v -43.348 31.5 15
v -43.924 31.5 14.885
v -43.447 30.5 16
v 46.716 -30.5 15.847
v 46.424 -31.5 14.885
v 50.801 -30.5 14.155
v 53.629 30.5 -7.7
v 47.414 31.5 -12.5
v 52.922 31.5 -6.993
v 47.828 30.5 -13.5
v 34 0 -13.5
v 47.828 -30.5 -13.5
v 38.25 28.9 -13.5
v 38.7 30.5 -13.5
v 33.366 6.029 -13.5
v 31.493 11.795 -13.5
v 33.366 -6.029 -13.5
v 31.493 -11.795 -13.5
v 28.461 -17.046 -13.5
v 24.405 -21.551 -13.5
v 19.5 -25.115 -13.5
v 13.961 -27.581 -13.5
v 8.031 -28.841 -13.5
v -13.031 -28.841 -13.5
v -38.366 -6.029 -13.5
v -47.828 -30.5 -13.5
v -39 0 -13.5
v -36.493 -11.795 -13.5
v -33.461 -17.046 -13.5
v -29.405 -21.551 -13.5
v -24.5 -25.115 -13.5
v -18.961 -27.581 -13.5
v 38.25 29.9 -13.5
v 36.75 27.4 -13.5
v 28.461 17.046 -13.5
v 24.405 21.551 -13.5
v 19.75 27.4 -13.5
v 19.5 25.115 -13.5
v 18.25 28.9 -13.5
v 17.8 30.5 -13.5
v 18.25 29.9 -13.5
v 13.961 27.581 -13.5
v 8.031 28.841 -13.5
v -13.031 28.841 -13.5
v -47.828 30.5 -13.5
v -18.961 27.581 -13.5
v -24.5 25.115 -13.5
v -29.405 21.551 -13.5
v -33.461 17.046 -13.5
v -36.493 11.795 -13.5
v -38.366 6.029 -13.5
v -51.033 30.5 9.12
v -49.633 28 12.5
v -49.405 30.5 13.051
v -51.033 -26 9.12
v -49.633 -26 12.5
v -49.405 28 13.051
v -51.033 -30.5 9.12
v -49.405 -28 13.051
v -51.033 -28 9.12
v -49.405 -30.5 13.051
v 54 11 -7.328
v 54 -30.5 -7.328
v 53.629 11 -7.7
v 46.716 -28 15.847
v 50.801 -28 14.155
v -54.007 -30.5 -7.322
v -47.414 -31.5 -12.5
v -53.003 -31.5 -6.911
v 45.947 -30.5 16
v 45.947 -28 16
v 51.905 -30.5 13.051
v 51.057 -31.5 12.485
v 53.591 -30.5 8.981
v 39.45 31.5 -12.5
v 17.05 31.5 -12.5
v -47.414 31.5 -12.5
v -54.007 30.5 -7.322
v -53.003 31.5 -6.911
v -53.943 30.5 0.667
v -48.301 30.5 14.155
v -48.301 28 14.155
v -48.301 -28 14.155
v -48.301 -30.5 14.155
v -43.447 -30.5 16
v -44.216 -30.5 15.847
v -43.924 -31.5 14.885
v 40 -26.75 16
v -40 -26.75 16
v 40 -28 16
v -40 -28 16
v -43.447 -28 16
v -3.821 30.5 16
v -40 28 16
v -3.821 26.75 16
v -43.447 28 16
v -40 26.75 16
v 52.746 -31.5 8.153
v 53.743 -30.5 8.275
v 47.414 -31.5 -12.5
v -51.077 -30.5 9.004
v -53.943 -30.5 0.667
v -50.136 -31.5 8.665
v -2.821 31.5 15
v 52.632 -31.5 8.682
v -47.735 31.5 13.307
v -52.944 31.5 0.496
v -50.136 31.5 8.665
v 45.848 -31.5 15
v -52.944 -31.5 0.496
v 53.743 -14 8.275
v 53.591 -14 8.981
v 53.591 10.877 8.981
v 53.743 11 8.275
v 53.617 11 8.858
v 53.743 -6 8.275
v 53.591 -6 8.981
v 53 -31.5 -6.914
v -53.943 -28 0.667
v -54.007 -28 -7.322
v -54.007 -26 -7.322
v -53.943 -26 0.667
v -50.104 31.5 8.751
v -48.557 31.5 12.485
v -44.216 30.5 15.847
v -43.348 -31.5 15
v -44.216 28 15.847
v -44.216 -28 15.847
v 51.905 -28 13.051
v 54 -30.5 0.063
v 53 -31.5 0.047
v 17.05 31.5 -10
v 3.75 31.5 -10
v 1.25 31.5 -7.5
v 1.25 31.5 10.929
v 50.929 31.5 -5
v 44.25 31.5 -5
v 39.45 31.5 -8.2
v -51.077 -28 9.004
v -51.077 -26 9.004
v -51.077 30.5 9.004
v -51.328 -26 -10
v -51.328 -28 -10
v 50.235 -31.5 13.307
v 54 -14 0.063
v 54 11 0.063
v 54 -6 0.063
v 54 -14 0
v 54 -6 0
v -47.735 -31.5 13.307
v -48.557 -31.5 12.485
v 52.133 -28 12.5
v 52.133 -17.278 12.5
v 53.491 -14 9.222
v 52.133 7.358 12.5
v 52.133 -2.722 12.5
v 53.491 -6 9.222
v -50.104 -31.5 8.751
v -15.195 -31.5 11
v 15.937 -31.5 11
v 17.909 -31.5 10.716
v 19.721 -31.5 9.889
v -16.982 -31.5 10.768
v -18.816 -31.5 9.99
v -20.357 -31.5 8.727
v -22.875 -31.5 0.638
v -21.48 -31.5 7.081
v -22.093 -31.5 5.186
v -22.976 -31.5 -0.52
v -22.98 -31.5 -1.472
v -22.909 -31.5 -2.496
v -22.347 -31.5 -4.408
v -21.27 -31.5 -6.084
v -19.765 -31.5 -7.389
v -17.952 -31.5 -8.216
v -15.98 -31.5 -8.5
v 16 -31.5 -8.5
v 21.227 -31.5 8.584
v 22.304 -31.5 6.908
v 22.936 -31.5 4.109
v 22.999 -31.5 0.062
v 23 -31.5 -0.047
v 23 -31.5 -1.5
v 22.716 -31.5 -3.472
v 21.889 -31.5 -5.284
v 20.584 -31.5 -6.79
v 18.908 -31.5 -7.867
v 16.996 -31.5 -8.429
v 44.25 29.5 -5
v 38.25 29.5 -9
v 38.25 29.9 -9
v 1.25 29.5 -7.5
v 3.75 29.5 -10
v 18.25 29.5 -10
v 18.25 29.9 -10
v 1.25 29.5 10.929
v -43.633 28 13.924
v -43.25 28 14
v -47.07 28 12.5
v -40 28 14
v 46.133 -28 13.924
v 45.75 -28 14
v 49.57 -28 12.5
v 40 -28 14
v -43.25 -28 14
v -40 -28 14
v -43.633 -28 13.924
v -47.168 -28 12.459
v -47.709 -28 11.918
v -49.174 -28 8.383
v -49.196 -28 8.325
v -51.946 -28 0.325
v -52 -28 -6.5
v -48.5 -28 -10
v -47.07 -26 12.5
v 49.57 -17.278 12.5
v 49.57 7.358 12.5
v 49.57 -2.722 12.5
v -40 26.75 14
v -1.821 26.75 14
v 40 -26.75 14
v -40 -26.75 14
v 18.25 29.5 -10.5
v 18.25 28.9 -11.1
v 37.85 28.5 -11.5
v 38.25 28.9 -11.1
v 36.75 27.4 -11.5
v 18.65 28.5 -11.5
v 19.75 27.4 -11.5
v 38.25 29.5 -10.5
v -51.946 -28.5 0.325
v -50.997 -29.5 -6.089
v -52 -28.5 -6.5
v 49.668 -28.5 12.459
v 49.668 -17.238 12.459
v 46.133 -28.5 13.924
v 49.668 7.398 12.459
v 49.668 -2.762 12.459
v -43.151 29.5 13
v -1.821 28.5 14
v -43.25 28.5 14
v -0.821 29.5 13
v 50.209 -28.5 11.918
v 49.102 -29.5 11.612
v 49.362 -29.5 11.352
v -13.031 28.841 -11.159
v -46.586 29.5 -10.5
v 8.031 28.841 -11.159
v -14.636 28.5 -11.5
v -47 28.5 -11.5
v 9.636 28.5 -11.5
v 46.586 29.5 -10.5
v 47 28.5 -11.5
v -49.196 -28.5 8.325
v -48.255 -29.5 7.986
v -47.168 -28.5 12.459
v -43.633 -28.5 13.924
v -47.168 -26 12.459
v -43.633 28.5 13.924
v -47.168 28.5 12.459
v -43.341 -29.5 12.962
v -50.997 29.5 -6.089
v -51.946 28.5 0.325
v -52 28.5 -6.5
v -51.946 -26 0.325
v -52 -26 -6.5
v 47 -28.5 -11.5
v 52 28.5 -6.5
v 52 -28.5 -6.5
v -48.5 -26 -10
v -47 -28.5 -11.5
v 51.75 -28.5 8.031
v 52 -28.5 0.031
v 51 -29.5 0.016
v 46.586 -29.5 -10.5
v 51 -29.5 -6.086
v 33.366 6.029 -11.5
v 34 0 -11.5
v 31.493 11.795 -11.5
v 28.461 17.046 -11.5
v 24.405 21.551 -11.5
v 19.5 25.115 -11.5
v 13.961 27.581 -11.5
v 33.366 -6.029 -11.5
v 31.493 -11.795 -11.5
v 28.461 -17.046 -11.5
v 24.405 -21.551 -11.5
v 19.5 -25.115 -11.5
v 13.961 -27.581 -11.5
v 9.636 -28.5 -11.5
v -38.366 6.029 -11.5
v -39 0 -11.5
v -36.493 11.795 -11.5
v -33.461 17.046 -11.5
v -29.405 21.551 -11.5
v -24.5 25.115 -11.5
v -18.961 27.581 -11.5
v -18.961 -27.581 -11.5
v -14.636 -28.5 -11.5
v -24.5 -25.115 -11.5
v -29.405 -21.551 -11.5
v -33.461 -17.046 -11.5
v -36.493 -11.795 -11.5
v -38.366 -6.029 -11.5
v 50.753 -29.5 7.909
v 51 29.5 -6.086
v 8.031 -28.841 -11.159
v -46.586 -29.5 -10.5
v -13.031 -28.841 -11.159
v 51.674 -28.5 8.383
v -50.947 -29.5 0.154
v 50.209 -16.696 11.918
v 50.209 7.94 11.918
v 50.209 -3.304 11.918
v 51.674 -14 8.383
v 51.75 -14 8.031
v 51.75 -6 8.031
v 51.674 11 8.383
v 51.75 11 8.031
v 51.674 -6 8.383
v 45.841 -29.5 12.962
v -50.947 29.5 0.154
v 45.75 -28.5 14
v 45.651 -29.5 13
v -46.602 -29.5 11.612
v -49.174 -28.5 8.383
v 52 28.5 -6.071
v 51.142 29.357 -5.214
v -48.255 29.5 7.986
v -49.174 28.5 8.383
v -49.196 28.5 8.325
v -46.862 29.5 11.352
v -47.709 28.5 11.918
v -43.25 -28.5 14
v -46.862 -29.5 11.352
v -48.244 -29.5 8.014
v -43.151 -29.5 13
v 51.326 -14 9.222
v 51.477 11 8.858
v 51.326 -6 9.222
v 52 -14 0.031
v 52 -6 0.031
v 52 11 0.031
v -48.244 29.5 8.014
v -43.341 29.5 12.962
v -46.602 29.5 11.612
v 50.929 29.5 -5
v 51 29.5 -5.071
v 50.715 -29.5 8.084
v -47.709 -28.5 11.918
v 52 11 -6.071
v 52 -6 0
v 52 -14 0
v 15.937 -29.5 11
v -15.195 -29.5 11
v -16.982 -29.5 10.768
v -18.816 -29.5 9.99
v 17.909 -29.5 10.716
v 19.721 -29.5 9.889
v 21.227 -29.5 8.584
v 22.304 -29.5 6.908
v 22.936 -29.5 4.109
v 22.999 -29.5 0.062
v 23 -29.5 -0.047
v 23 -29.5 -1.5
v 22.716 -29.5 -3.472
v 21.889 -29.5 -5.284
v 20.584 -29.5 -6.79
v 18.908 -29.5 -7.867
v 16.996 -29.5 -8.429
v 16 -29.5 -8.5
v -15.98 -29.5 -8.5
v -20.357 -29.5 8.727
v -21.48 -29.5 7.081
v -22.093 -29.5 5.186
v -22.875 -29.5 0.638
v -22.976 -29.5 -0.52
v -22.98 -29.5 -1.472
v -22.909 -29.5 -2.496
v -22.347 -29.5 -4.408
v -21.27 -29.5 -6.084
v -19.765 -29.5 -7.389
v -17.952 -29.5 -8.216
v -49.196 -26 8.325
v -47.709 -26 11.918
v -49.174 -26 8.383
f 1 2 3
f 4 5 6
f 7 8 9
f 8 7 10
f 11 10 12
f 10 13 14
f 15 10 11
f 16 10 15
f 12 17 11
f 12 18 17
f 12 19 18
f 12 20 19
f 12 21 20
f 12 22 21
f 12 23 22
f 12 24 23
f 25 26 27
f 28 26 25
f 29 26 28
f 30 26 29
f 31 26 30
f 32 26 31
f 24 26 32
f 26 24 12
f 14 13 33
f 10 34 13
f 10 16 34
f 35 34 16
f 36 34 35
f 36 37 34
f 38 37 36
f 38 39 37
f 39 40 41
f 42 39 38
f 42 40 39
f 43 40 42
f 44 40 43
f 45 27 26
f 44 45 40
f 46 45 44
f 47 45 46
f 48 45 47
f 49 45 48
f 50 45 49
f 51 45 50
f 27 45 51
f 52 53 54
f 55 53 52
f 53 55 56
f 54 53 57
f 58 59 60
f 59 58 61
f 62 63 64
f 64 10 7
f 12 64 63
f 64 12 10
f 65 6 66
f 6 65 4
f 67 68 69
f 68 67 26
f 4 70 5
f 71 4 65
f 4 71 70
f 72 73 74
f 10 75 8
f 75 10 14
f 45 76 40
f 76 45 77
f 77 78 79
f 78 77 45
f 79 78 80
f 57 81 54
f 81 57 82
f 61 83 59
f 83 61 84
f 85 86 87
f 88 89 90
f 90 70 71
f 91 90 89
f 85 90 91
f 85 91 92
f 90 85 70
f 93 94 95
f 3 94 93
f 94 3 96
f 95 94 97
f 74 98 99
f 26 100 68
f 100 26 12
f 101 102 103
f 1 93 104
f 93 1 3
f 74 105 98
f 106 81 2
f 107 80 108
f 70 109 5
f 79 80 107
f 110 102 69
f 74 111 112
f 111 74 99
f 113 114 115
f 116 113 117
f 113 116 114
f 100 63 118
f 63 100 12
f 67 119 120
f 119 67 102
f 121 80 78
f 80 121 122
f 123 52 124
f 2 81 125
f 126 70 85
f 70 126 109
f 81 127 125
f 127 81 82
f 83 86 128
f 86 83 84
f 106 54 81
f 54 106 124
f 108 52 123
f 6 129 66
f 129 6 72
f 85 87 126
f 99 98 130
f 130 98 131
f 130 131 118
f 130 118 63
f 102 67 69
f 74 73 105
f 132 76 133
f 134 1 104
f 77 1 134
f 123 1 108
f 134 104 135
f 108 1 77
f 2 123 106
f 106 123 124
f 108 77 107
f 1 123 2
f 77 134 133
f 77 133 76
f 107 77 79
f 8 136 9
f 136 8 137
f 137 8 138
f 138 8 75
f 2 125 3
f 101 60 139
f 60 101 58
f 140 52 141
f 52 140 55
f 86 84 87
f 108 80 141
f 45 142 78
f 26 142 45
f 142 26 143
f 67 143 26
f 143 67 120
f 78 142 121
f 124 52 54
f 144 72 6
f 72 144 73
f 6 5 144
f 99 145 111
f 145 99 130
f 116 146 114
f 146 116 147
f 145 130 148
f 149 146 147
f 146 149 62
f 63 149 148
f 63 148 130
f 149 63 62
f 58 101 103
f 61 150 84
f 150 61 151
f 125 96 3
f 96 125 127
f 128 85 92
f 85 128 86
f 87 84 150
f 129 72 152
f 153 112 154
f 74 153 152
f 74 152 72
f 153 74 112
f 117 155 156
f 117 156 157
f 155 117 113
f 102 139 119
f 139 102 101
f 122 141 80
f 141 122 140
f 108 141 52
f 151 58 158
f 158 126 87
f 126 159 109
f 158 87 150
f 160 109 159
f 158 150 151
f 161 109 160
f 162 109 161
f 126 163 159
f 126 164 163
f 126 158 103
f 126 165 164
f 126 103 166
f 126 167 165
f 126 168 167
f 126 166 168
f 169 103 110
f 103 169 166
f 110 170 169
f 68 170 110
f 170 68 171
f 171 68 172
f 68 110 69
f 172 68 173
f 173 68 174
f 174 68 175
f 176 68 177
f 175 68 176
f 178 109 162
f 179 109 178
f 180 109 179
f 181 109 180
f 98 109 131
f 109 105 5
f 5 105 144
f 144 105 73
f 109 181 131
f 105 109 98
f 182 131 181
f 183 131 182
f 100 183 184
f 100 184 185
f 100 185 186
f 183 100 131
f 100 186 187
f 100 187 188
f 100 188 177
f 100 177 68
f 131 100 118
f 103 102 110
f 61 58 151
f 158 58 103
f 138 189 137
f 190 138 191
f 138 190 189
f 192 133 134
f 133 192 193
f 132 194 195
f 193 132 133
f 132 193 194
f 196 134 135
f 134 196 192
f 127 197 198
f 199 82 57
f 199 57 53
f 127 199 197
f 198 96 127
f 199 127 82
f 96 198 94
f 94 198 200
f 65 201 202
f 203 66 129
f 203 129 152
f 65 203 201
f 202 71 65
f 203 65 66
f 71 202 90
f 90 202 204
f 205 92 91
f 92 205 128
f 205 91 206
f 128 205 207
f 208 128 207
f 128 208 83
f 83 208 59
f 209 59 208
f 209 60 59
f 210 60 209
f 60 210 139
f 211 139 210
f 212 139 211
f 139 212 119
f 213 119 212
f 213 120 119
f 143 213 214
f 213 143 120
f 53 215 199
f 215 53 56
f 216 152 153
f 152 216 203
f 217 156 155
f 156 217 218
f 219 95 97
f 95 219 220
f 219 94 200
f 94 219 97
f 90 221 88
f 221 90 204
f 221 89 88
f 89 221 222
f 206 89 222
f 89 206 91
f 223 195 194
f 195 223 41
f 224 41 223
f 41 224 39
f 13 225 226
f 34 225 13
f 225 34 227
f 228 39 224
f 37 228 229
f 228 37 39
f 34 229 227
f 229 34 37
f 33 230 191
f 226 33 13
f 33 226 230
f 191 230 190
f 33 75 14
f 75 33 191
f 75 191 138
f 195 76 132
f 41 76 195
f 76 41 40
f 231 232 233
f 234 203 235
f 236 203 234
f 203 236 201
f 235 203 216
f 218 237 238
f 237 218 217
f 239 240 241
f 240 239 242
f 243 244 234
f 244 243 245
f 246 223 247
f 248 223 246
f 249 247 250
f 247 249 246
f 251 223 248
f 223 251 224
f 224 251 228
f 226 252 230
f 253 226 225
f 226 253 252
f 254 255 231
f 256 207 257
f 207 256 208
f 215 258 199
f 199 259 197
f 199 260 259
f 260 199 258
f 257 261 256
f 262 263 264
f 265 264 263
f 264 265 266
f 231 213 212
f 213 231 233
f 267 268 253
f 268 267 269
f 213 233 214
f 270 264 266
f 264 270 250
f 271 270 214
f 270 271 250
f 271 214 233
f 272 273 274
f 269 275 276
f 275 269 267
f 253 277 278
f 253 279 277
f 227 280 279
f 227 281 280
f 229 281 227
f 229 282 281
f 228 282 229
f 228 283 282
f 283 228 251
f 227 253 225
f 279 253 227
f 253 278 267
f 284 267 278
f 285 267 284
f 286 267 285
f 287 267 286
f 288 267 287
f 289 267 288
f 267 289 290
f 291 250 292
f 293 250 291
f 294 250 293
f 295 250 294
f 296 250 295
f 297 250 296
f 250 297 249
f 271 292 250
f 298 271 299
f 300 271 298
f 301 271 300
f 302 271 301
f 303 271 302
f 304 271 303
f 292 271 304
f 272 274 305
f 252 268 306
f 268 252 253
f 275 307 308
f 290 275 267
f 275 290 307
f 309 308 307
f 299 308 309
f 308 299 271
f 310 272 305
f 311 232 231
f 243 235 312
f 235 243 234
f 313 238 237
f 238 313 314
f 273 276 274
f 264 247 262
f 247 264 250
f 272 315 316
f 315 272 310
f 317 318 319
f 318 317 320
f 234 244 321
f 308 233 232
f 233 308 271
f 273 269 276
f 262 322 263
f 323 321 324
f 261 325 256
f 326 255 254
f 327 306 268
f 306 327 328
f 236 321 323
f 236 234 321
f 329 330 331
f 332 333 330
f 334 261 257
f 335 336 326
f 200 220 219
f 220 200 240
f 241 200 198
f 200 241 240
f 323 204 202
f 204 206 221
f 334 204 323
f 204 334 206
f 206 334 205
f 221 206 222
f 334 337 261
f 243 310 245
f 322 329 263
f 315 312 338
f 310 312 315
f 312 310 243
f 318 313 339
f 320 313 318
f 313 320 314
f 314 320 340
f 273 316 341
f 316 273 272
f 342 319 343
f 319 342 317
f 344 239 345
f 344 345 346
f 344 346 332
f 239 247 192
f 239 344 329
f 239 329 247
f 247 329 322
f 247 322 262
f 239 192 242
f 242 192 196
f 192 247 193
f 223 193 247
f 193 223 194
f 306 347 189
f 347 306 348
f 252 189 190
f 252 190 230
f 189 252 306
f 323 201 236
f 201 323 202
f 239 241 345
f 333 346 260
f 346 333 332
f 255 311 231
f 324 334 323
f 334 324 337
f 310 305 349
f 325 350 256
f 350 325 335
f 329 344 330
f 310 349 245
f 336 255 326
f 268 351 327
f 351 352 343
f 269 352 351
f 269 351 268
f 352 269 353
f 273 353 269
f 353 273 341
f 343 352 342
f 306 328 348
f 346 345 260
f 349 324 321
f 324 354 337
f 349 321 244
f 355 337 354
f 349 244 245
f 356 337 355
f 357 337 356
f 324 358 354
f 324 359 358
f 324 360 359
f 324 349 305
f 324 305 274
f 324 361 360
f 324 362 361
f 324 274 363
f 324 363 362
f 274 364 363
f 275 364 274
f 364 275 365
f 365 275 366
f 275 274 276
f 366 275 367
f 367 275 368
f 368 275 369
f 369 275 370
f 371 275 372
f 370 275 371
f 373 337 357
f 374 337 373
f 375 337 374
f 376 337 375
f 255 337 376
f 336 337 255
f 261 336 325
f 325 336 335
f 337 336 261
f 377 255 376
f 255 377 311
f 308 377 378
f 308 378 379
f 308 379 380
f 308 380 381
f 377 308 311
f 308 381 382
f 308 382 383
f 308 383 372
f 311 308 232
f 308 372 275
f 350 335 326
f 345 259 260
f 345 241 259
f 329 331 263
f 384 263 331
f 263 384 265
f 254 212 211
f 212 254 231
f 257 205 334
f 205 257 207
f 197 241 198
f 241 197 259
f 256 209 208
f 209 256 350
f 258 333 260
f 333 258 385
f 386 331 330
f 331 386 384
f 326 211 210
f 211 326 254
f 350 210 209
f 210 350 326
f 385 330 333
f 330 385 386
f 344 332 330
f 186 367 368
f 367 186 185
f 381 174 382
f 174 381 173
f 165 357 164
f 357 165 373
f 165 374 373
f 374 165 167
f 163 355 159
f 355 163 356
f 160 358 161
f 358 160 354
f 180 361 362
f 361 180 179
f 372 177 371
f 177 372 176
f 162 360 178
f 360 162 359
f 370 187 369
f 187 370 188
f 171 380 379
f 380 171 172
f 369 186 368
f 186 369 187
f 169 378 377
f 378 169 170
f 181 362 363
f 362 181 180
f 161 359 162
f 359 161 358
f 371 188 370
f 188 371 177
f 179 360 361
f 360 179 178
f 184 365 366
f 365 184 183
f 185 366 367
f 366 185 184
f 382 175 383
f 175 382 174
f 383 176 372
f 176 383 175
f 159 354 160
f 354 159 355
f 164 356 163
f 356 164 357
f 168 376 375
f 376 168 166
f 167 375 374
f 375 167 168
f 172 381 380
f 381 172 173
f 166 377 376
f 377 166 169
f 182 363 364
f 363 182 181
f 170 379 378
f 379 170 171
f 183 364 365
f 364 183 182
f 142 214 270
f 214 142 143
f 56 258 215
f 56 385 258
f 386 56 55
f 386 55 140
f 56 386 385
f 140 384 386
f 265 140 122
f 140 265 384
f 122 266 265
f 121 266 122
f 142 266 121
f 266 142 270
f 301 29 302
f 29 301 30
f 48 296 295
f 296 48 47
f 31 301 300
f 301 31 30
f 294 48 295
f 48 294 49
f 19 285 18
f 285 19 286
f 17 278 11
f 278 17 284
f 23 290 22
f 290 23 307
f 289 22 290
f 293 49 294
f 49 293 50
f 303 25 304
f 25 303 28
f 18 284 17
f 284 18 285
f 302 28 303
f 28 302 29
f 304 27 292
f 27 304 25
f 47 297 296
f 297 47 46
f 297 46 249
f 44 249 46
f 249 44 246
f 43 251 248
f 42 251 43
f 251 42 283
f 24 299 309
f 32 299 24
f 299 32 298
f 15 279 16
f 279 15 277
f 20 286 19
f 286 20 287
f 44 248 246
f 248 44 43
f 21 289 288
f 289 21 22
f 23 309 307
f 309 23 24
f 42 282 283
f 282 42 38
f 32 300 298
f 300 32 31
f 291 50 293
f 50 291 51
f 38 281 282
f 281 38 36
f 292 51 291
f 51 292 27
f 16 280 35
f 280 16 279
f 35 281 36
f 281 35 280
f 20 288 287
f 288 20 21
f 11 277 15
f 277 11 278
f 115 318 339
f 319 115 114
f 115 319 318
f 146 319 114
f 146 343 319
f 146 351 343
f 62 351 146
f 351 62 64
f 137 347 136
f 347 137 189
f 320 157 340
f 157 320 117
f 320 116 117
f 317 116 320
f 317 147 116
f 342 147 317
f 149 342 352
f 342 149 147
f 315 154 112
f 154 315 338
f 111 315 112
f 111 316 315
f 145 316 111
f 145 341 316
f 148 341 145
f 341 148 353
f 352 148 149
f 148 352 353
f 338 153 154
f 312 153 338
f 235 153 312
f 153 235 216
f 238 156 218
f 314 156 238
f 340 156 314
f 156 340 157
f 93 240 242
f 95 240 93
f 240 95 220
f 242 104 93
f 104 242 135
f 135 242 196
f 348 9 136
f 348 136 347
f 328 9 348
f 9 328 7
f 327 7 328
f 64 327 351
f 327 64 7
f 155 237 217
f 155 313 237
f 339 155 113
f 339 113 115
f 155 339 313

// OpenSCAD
// file: polyround2019.scad
//p=mirrorPolyline([[-1,-4,11,4],[-10,0,14,4],[-12,20,20,4],[-20,50,40,4],[-20,80,40,4],[-20,110,30,4],[-10,100,0,4],[-10,0,0,5],[-20,5,5,4],[-20,5,16,2],[-10,4,12,4] ]);

//polyline(p);
// 
//
// color ("yellow")polyline (polyRound(let(ip=([for (i=[0:3])[rnd(0,30),rnd(0,100),rnd(0,30),2+rnd(2)] ]))
//     mirrorPolyline([for(i=[0:0.5:len(ip)-1]) i==floor(i)?ip[i]: ip[i]+
//     [
// floor(rnd(2))==0? 0:max(0,rnd(10,20)*sign(rnd(-1,1))),
// floor(rnd(6))==0? 0:rnd(10,20)*sign(rnd(-1,1)),
// floor(rnd(2))==0? 0.01:rnd(10,20)*sign(rnd(-1,1)),
// 0(0,30),2+rnd(2)] ]))
//     mirrorPolyline([for(i=[0:0.5:len(ip)-1]) i==floor(i)?ip[i]: ip[i]+
//     [
// floor(rnd(2))==0? 0:max(0,rnd(10,20)*sign(rnd(-1,1))),
// floor(rnd(6))==0? 0:rnd(10,20)*sign(rnd(-1,1)),
// floor(rnd(2))==0? 0.01:rnd(10,20)*sign(rnd(-1,1)),
// 0
// ]  ])) ,2.5);
// ]  ])) ,1.5);
// 
// color ("darkgrey")polyline (polyRound(let(ip=([for (i=[0:2])[rnd(0,30),rnd(0,100),rnd


function polyRound(radiipoints,fn=5)=
// reworte most of it all here heavily use of wrap function
let(p=getpoints(radiipoints)) 
let(r=getradii(radiipoints))
let(Lp1=last(p),Lp=Lp1+1) 
let(
temp=[for(i=[0:last(p)]) 
round3points(
[ p[wrap(i-1,Lp,0)], p[wrap(i  ,Lp,0)], p[wrap(i+1,Lp,0)]],
r[i],
fn)])   //common trick  to flatten a list of list
[for (a = temp )        for (b = a) b];






 
 


function round3points(v,r,fn=6)=let(
p0=v[0],p1=v[1],p2=v[2],
n01=un(p0-p1),
n21=un(p2-p1),
planeNormal=un(cross(n21,n01)),
 

midLineNormal=un(n01 +n21),
 
angle=angle(n21,n01),
tanD=r /sin(angle/2),
 
center=p1+  midLineNormal*( tanD)
 

)
concat(
 [ for(i=[-.5:1/fn:.5])
    
center+ rotateAxis(   -midLineNormal*r ,planeNormal,(-i)*angle +180*i )    
] );

 
function angle (a,b)=atan2(sqrt((cross(a,b)*cross(a,b))),(a* b));
function dot(v1,v2) = v1[0]* v2[0]+ v1[1]* v2[1]+ v1[2]* v2[2];
function dot4(v1,v2) = v1[0]* v2[0]+ v1[1]* v2[1]+ v1[2]* v2[2]+ v1[3]* v2[3];

function point2plane(p,o,n) =
let (v = o - p) p + (n * (v.x * n.x + v.y * n.y + v.z * n.z)); //proj ap to a plane
function dist_point2plane(p,o,n) =
let (v = p-o) ( (v.x * n.x + v.y * n.y + v.z * n.z)); //proj ap to a plane
function mirrorPolyline(v)= [each v, each rev([for (i=v)[-i.x,i.y,i.z,i[3]]])] ;

function v3(p) = [p.x,p.y,p.z]; // vec3 formatter
function rev(v) = [for (i = [len(v) - 1: -1: 0]) v[i]];
function avrg(l) = len(l) > 1 ? addl(l) / (len(l)) : l;
function avrgp(l) = len(l) > 1 ? addlp(l) / (len(l)) : l;
function addlp(v,i=0,r=[0,0,0]) = i<len(v) ? addlp(v,i+1,r+v[i]) : r;
function lerp(start,end,bias) = (end * bias + start * (1 - bias));
function un(v)=assert (is_list(v)) v/max(norm(v),1e-64) ;
function rndc(a = 1,b = 0,s = [])=[rnd(a,b,s),rnd(a,b,s),rnd(a,b,s)];
function rnd(a = 1,b = 0,s = []) =
s == []?(rands(min(a,b),max(a,b),1)[0]) :(rands(min(a,b),max(a,b),1,s)[0]);
function getpoints(p)=[for(i=p)[i.x,i.y,i.z]];// gets [x,y]list of[x,y,r]list
function getradii(p)= [for(i=p)is_num(i[3])? i[3]: 0 ]; // gets [r]list of[x,y,r]list
function wrap(x,x_max=1,x_min=0) = (((x - x_min) % (x_max - x_min)) + (x_max - x_min)) % (x_max - x_min) + x_min; // wraps numbers inside boundaries
function last(i)=len(i)-1;// shorthand sugar for len(i)-1

module polyline(p,r=1) {for(i=[0:max(0,len(p)-2)])line(p[i],p[wrap(i+1,len(p) )],r);}

module polyline_open(p,r=1) {
     if (len(p)-1>1)
     for(i=[0:max(0,len(p)-2)])line(p[i],p[   i+1],r);
} // polyline plotter

module line(p1,p2 ,width=1) 
{ // single line plotter
hull() {
translate(v3(p1)) sphere(width);
translate(v3(p2)) sphere(width);
}
}

module 3dcircle(r,n)
{
axis=cross([0,0,1],n);
theta=angle ([0,0,1],n);
rotate (theta,axis) circle(r);
}


 function rotateAxis(point,axis,angle)=RotateQuat(BuildQuat(axis,angle), point);

function  /*vec4*/  NormQuat(/*vec4*/q)=
 let(     lenSQ =  dot4(q, q),     invLenSQ = 1./lenSQ)     q*invLenSQ;
 

function /*vec4*/ BuildQuat(/*vec3*/  axis,   angle)= 
     NormQuat(concat(axis *sin(angle*0.5),[ cos(angle*0.5)]));


 function /*vec3*/RotateQuat(/*vec4*/q, /*vec3*/v)=
let(    /*vec3*/ t = 2.*cross([q.x,q.y,q.z], v)     )    v + q[3]*t + cross([q.x,q.y,q.z], t);




//
// function /*vec4*/MulQuat(/*vec4*/q1, /*vec4*/q2)=
//{
//    /*vec4*/res = vec4(0.);
//    res.w   = q1.w*q2.w - dot(q1.xyz, q2.xyz);
//    res.xyz = q1.w*q2.xyz + q2.w*q1.xyz + cross(q1.xyz, q2.xyz);
//     NormQuat(res);
//}
//
// 
//    
//
//
function fromTo(/*vec3*/p,/*vec3*/q)=
 
 acos(dot(p,q));

 
// function /*vec4*/quatLookAt(/*vec3*/forward,/*vec3*/up){
//    forward=normalize(forward);
//    up=normalize(up);
//  (BuildQuat(cross(forward,up),fromTo(forward,up)));
//}
//
//
// function /*vec4*/quatInv(in /*vec4*/q)=
//{
//     vec4(-q.xyz, q.w);
//}
// main file
    include<polyround2019.scad>
cage=false;
//cage=true;
c1=17.5/2+1;
c2=4+1;
c3=59;
hc3=58/2;
l1=102/2-c1;
l2=102/2-c2*1.5+1;
l3=(24-c1*2)+c2-1.5;
fxtra=0;
shell=2;
wl1=l1+c1*1;
wl3=l3+c2/2+1;
wl3f=l3+c2/2+1+fxtra;
whc3=hc3+1.5;
r=4;
r2=10;
     path=  polyRound( [
     [ wl1-10,wl3f,whc3,3],
    [ wl1,wl3f,whc3,3], 
   [ wl1,wl3f,-whc3,r],  [wl1,-wl3,-whc3,r2], [-wl1,-wl3,-whc3,r2],
     [-wl1,wl3f,-whc3,r],[-wl1,wl3f,whc3,r],  
      [-wl1,-wl3,whc3,r2], 
     [ wl1-47,-wl3,whc3,r2], 
     [ wl1-47,wl3f,whc3,3], 
//     [ wl1-35,wl3f,whc3,3],   
//     [ wl1-35,wl3f,whc3-10,3],   
      
    ]
  ,fn=4);
  
  
       path2=   ( [
       [0, 0, 30], [0, 20, 30], 
       [21.2132, 20, 21.2132]       ,[21.2132, 0, 21.2132]       ,
       [30, 0, 0],    [30, 20, 0], 
       [21.2132, 20, -21.2132],        [21.2132, 0, -21.2132], 
       [0, 0, -30],   [0, 20, -30],
       [-21.2132, 20, -21.2132],  [-21.2132, 0, -21.2132], 
       [-30, 0, 0],[-30, 20, 0],
       [-21.2132, 20, 21.2132],        [-21.2132, 0, 21.2132], 
      [0, 00, 30], 
       
       ]*1.03
       
   );
//       echo(path2);
//*difference(){
//    union(){
//translate([0,-29,0])    rotate([0,90/4+0,0]) translate([0,l2 ,0])    polyline(path2,4);
//translate([0,10.5,0])rotate([-90,0,0])cylinder(8,hc3+6,hc3+6);
//    }
//translate([0,0,0])rotate([-90,0,0])cylinder(60,hc3,hc3);
//
//}
rotate([-90,0,0])difference(){
union(){
difference(){
hull(){
    linear_extrudeSH(c3+shell*2, $convexity=100,center=true) offset(delta=shell,$fn=1)topprofile();
//  translate([0,fxtra,0])  linear_extrudeSH(c3+shell*2, $convexity=100,center=true) offset(shell,$fn=1)topprofile();
    }
hull(){
    translate([l1-21,-10,hc3+shell-2])// top notch1
       cube([33,40,shell*3.6-3+3],center=true);
    translate([l1-21,-10,hc3+shell-2])// top notch1
       cube([38,35,shell*3.6-3+3],center=true);
    translate([l1-16,-15,hc3+shell-2])// top notch1
       cube([38,40,shell*3.6-3+3],center=true);}
    
//     #translate([l1-17,-15,hc3+shell]) rotate([0,0,45]) cube([40,20,80],center=true);// chamfer
}
        
//translate([0,0,0])hull()
//{
//        linear_extrudeSH(c3+shell*2, $convexity=100,center=true) offset(shell)topprofile();
//
// translate([-20,0,0])rotate([-90,0,0])cylinder(21,hc3+2.5,hc3+2.5);
//translate([20,0,0])rotate([-90,0,0])cylinder(21,hc3+2.5,hc3+2.5);
//     translate([-20,0,0])rotate([-90,0,0])cylinder(22,hc3+1,hc3+1);
//translate([20,0,0])rotate([-90,0,0])cylinder(22,hc3+1,hc3+1);
//}
if(cage)translate([0,-c2+2 ,0 ])polyline(path,4.1);
}


   translate([l1-13 ,0,hc3+shell])// top notch
hull(){
    cube([20-3,40-3,shell*3.6],center=true);
   cube([20,40,shell*3.6-3],center=true);
}   

translate([l1-13 ,0,hc3+shell+shell*1.25])// top notch
 hull(){
    cube([23-3,43-4,shell*3.6],center=true);
   cube([23,43,shell*3.6-4],center=true);
}

    
linear_extrudeSH(c3, $convexity=100,center=true) topprofile();
translate([0,0,-hc3])linear_extrudeSH(shell*34, $convexity=100,center=true) offset(7)offset(-10)scale([.5,1])topprofile();


translate([-90,-.5,-hc3+1])linear_extrudeSH(2, $convexity=100 ) topprofile();
//mirror([0,0,1])translate([-90,-4,-hc3+1])linear_extrudeSH(2, $convexity=100 ) topprofile();

 
//union( convexity=100){
//linear_extrude(2, $convexity=100) offset(3)  topprofile();
//translate([0,0,c3*2+3])linear_extrude(2, $convexity=20) offset(3)  topprofile();
//linear_extrude(c3*2+4, convexity=100)
//
//difference()
//{
// offset(2)   topprofile();
//    topprofile();
//}
//}

    
    
translate([0,0,0])hull()
{
 translate([-10,0,0])rotate([-90,0,0])cylinder(25,hc3,hc3);
translate([5,0,0])rotate([-90,0,0])cylinder(25,hc3,hc3);
}

 
translate([0,-20,0]) difference(){
    cube([120,15,56],center=true);// display
translate([-15,-0,28])     cube([50,15,2.5],center=true);// display
translate([-0,-0,-28])     cube([80,15,2.5],center=true);// display

}


//translate([l1-8,-10,hc3+shell])// top notch
//hull(){
//    cube([42-3,40-3,shell*3.6],center=true);
//   cube([42,40,shell*3.6-3],center=true);
//}
 translate([l1,-15,hc3+shell])  cube([40,40,40],center=true);
 translate([l1,-15,-10])  cube([40,30,8],center=true);
 translate([l1,-13,-10]) rotate([45,0,0]) cube([40,11,11],center=true);
 if(!cage) translate([l1-35,-13,hc3]) rotate([0,0,45]) cube([40,10,10],center=true);
 if(!cage) translate([l1+c1,-2,hc3]) rotate([0,0,45]) cube([40,10,36],center=true);
 translate([l1,-3-20,hc3+shell-20]) rotate([-45,0,0]) cube([40,20,40],center=true);// chamfer


}
function clamp(v,a=0,b=1)=min(max(v,min(a,b)),max(1,b));


module topprofile(){
 hull(){
     offset(1,$fn=1)
hull(){
translate([l1,0])  circle(c1,$fn=8);
translate([-l1,0])  circle(c1,$fn=8);
 

translate([c2*.25,-l3])
 {
translate([l2,0])  circle(c2,$fn=8);
translate([-l2,0])  circle(c2,$fn=8);
}




} 
translate([0,c2+1.5]) 
 {
translate([l2+c2/2,0])  circle(c2,$fn=4);
translate([-l2-c2/2,0])  circle(c2,$fn=4);
}
}
}

module linear_extrudeSH(h,convexity=100,center )
{
    hull(){
    linear_extrude(h-2, $convexity=convexity,center=center) children();
    linear_extrude(h , $convexity=convexity,center=center) offset(r=-1  )children();

    }
    }
